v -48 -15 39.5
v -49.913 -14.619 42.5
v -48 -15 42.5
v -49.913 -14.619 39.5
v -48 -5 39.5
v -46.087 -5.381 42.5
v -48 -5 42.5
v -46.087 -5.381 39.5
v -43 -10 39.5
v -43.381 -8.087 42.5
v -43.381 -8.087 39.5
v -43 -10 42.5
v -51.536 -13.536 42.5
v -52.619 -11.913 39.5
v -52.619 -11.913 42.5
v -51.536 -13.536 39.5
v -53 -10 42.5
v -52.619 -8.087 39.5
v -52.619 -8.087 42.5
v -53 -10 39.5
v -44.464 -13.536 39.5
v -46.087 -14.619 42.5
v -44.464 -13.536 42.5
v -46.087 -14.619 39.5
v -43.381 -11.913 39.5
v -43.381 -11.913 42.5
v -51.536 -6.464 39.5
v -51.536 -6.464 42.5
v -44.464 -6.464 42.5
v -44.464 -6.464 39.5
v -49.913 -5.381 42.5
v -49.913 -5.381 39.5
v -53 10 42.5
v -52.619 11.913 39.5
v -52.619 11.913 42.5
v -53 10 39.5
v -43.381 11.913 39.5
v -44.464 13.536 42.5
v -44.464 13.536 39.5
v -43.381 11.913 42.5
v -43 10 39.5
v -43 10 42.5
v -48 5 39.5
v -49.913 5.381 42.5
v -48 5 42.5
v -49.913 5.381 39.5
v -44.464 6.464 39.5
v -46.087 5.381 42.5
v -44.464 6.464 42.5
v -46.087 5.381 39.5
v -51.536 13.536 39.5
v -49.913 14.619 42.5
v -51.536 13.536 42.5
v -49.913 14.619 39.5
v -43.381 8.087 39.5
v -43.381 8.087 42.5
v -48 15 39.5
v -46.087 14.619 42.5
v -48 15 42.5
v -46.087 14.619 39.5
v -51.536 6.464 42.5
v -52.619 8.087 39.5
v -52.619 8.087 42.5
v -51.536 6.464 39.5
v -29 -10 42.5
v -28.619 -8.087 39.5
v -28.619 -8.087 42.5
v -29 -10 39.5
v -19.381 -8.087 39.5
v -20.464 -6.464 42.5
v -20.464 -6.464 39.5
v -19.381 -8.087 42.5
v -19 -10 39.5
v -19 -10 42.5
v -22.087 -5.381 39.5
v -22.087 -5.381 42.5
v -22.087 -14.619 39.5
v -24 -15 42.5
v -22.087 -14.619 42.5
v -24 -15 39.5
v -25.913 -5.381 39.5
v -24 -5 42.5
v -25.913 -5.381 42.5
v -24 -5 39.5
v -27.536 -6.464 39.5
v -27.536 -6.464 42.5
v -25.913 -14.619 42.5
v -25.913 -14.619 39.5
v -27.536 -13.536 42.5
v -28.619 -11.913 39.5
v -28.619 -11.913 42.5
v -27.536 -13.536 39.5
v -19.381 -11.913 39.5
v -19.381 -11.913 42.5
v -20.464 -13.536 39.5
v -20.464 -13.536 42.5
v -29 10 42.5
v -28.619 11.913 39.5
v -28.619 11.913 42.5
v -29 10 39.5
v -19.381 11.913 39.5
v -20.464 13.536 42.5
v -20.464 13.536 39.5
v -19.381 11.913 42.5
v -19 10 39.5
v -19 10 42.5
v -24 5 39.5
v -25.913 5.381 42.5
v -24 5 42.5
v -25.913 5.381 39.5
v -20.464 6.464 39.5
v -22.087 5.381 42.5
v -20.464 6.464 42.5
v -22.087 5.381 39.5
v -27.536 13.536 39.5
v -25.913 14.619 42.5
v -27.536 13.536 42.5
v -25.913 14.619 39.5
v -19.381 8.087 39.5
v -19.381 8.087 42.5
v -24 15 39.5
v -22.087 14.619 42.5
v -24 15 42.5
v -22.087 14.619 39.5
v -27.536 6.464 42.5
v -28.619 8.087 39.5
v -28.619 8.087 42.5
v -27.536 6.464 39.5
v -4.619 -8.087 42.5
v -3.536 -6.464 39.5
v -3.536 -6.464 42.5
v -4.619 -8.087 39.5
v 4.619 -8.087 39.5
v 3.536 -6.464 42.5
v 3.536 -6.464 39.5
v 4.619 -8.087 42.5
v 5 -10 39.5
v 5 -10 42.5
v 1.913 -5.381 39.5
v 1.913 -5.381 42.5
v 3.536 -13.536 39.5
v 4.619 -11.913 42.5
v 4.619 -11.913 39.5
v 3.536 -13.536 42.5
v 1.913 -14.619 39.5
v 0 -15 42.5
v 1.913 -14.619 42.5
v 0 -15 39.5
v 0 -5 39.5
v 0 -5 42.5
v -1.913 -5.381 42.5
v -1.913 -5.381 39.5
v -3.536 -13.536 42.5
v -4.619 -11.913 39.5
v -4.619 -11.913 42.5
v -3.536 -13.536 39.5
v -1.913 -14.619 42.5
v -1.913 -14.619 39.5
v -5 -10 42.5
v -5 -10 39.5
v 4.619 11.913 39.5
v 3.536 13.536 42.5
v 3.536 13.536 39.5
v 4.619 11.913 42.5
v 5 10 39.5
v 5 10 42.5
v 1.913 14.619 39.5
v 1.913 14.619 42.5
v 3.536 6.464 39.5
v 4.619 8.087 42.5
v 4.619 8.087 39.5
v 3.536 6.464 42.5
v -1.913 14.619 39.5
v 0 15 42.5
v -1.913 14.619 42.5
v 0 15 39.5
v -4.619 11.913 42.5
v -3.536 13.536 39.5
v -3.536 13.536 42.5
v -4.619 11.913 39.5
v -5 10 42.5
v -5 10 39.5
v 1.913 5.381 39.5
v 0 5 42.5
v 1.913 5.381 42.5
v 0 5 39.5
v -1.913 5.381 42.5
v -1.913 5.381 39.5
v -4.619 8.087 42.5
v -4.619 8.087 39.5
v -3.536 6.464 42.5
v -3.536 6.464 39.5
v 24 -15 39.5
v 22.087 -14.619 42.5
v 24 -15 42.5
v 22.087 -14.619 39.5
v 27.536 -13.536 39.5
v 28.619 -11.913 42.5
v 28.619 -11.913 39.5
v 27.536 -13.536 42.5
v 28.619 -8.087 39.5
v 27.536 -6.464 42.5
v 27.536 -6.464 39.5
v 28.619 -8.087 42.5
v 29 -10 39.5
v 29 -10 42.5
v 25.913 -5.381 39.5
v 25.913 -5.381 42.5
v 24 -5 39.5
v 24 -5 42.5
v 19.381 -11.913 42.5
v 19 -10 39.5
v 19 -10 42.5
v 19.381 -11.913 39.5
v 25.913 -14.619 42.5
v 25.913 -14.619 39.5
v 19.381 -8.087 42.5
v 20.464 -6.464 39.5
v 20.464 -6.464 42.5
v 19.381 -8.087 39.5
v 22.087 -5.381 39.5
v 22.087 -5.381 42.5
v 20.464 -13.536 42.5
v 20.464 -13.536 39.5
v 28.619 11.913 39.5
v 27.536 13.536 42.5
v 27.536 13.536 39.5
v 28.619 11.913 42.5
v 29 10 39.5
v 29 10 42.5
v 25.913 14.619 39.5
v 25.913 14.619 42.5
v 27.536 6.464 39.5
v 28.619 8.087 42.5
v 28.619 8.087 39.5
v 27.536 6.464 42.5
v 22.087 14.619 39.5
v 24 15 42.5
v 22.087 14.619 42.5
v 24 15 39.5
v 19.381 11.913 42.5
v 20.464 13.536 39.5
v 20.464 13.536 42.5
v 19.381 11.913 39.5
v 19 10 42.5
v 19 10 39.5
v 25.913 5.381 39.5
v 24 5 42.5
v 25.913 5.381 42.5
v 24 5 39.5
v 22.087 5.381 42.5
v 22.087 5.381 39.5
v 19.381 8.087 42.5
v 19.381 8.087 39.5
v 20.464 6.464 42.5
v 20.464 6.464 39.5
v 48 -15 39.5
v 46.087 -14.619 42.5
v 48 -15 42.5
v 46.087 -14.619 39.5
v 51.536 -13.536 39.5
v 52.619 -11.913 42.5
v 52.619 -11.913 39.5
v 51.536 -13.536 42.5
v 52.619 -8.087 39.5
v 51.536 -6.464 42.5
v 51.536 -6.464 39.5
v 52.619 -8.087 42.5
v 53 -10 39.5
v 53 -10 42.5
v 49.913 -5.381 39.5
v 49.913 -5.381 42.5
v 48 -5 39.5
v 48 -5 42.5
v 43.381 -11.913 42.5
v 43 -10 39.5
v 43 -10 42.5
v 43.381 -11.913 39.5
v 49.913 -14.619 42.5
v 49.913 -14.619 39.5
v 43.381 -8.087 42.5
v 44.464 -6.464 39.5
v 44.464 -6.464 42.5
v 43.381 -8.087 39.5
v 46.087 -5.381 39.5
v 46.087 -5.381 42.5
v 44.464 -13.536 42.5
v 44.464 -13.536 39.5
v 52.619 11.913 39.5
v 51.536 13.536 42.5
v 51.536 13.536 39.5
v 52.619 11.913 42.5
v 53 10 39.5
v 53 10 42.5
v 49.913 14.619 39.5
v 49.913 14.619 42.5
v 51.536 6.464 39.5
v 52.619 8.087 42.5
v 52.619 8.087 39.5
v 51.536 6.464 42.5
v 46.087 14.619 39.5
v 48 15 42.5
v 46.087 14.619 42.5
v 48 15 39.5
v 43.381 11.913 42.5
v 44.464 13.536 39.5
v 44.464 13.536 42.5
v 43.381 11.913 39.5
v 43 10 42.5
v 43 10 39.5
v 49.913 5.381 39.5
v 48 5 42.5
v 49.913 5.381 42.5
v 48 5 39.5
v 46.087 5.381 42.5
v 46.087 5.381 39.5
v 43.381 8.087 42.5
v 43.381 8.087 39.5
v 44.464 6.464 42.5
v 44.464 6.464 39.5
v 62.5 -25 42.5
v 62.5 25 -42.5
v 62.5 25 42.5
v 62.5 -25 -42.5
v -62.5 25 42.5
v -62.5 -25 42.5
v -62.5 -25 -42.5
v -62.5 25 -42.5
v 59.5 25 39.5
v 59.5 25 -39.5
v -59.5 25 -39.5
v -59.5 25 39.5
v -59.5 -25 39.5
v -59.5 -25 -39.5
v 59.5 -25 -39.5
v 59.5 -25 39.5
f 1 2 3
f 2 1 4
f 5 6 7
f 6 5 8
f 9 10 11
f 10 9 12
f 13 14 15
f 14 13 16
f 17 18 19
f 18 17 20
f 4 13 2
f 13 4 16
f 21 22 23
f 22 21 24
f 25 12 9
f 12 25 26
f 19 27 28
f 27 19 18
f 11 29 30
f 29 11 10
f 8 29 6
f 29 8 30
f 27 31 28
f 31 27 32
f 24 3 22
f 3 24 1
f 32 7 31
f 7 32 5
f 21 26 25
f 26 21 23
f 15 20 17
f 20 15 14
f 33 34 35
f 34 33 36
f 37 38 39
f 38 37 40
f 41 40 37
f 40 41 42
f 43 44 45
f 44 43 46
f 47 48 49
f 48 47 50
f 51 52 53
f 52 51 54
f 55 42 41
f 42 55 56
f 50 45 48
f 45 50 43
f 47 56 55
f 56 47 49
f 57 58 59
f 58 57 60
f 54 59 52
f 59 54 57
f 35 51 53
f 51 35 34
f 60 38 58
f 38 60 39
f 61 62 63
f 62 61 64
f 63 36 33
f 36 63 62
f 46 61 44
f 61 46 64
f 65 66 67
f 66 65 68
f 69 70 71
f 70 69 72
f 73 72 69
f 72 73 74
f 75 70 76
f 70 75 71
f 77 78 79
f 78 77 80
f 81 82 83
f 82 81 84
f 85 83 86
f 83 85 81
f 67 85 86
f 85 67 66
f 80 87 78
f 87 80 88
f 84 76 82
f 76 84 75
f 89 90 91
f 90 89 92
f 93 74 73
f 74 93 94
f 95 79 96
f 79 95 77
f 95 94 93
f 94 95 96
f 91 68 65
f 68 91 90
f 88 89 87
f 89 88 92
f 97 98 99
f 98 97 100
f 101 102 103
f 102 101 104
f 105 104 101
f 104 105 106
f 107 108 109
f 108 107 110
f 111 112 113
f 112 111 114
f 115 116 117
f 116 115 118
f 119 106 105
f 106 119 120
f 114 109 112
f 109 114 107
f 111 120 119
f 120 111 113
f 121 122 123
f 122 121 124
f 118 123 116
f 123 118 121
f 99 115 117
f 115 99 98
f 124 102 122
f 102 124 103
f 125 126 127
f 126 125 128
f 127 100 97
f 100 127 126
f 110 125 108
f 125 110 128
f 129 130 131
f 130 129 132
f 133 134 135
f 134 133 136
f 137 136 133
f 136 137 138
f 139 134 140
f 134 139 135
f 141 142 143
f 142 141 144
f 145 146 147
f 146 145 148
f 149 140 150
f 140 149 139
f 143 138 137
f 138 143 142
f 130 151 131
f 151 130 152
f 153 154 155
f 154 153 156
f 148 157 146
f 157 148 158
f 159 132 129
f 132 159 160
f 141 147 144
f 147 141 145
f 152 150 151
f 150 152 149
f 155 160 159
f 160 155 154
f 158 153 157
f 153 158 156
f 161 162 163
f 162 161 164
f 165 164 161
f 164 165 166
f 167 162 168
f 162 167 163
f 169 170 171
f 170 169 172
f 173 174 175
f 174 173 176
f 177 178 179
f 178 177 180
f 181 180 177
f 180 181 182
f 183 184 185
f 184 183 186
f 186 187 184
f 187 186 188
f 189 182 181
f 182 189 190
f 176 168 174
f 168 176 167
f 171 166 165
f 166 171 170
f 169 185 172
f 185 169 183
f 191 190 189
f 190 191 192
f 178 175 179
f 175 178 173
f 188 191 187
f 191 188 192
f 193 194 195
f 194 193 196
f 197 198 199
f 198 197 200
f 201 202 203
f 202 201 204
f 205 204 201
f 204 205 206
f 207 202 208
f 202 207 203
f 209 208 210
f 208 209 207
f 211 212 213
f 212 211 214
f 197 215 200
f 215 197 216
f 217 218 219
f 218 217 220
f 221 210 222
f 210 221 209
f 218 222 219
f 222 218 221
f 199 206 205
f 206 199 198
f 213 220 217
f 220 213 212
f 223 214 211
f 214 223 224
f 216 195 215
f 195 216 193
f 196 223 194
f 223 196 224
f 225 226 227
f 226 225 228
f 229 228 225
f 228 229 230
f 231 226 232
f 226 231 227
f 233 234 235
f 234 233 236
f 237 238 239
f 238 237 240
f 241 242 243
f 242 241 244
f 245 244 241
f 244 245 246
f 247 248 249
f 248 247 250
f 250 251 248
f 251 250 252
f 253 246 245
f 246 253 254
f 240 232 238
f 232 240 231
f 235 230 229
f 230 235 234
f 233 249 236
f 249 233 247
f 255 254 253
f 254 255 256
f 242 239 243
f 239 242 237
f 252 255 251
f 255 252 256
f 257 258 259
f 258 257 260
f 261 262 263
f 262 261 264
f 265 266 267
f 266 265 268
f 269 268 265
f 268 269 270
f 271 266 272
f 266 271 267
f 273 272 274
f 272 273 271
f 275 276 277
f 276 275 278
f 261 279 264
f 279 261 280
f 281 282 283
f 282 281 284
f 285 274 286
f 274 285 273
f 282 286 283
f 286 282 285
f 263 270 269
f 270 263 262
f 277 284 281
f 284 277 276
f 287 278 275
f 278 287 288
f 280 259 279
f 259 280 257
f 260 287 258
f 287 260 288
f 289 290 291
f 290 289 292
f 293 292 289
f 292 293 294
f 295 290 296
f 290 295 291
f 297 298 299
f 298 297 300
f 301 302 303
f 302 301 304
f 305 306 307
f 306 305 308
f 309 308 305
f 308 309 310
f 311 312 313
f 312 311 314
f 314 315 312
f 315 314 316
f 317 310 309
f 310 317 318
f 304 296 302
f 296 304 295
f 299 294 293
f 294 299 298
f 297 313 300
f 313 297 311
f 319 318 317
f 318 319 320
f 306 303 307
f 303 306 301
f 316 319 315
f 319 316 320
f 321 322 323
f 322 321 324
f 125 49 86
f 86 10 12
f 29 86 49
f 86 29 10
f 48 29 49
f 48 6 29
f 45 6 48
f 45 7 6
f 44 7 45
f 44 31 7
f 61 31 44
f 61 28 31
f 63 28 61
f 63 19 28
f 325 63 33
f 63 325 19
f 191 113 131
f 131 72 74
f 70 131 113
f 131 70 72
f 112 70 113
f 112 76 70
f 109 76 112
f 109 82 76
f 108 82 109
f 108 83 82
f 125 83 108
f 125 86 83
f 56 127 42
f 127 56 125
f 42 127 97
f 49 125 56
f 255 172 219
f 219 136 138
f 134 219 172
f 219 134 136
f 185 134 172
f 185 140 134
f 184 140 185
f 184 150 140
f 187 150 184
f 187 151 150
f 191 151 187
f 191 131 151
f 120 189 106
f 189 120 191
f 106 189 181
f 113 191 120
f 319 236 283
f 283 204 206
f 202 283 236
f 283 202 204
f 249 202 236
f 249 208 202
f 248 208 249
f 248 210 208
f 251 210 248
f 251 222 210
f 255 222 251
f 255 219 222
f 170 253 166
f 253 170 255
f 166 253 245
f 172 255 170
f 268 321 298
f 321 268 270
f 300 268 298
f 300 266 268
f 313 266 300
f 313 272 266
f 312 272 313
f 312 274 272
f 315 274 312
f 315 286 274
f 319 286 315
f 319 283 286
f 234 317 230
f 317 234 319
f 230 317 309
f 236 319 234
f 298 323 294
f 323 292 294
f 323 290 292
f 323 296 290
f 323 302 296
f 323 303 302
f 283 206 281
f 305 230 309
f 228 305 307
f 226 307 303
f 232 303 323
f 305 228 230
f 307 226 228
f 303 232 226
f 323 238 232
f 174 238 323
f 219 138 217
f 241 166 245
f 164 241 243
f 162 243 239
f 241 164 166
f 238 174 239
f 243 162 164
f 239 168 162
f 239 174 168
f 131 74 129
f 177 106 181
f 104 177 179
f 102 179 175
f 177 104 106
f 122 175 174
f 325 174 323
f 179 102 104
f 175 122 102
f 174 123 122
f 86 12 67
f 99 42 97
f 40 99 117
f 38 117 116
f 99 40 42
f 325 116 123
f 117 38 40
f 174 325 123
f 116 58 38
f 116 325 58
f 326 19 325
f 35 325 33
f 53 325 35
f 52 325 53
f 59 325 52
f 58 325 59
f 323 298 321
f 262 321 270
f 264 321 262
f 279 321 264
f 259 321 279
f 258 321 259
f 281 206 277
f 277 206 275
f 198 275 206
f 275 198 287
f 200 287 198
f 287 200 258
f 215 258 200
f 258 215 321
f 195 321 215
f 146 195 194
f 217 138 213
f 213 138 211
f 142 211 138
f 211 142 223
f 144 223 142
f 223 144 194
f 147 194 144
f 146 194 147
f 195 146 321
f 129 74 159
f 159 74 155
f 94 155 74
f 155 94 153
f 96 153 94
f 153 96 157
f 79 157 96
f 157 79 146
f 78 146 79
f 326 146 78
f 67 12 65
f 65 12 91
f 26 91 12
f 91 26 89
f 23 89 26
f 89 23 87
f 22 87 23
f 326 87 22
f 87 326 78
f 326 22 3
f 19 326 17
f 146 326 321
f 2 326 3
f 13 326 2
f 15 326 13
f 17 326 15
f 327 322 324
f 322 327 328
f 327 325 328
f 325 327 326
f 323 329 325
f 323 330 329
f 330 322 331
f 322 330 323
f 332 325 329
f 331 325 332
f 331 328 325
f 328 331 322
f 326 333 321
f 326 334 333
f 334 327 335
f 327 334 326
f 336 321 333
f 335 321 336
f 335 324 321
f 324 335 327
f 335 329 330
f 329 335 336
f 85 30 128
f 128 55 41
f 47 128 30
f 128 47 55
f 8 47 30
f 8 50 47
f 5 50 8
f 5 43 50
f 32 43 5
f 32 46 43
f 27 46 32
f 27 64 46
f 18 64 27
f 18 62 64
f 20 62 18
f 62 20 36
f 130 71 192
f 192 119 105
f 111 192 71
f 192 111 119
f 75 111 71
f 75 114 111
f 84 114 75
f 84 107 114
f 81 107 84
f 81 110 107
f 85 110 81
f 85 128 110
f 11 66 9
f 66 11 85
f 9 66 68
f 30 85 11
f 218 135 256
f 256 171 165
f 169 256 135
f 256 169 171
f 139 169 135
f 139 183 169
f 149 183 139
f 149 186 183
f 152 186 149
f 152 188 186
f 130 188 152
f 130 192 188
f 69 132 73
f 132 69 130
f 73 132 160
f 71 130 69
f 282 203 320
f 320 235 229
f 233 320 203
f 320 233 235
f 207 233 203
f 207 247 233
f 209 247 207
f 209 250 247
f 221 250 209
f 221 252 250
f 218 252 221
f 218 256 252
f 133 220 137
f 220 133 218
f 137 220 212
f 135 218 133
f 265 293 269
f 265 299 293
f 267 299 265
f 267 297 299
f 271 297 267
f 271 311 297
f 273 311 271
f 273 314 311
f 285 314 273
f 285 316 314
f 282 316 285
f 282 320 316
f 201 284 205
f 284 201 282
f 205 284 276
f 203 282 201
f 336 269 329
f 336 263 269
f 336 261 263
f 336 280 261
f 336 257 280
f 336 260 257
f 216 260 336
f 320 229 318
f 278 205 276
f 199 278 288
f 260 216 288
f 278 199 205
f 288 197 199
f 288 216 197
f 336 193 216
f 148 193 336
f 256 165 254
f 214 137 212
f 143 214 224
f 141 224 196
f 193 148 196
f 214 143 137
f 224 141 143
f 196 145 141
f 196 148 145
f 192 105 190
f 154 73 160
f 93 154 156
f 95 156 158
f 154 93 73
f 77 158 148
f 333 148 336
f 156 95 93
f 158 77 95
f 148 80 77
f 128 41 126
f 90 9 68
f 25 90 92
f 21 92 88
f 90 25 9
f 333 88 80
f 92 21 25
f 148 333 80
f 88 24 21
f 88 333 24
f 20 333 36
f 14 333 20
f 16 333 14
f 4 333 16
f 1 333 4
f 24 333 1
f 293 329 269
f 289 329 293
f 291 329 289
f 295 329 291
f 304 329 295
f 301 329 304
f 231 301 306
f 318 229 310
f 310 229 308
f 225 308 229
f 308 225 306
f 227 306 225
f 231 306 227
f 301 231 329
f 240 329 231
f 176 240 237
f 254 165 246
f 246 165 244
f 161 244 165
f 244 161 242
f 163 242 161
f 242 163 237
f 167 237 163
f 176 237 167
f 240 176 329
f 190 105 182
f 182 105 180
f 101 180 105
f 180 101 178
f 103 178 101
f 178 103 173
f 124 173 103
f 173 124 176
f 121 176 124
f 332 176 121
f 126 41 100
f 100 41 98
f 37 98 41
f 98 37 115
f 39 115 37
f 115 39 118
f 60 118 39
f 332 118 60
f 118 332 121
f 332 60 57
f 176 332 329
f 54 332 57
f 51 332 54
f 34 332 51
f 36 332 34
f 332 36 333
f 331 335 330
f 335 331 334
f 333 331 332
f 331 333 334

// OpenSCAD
// CC-BY-NC - Peter Provost <peter@provost.org>

// translate([0,0,85/2]) 
difference() {
    // Shell
    cube([25*5,25*2,85], center=true);
    // Middle space
    cube([25*5-6,25*2,85-6], center=true);
    // Top holes
    
    for(x=[0:4]) {
        for (y=[0:1]) {
            #translate([-48+24*x,-10+20*y,85/2]) cylinder(d=10, h=10, center=true);
        }
    }
}    
